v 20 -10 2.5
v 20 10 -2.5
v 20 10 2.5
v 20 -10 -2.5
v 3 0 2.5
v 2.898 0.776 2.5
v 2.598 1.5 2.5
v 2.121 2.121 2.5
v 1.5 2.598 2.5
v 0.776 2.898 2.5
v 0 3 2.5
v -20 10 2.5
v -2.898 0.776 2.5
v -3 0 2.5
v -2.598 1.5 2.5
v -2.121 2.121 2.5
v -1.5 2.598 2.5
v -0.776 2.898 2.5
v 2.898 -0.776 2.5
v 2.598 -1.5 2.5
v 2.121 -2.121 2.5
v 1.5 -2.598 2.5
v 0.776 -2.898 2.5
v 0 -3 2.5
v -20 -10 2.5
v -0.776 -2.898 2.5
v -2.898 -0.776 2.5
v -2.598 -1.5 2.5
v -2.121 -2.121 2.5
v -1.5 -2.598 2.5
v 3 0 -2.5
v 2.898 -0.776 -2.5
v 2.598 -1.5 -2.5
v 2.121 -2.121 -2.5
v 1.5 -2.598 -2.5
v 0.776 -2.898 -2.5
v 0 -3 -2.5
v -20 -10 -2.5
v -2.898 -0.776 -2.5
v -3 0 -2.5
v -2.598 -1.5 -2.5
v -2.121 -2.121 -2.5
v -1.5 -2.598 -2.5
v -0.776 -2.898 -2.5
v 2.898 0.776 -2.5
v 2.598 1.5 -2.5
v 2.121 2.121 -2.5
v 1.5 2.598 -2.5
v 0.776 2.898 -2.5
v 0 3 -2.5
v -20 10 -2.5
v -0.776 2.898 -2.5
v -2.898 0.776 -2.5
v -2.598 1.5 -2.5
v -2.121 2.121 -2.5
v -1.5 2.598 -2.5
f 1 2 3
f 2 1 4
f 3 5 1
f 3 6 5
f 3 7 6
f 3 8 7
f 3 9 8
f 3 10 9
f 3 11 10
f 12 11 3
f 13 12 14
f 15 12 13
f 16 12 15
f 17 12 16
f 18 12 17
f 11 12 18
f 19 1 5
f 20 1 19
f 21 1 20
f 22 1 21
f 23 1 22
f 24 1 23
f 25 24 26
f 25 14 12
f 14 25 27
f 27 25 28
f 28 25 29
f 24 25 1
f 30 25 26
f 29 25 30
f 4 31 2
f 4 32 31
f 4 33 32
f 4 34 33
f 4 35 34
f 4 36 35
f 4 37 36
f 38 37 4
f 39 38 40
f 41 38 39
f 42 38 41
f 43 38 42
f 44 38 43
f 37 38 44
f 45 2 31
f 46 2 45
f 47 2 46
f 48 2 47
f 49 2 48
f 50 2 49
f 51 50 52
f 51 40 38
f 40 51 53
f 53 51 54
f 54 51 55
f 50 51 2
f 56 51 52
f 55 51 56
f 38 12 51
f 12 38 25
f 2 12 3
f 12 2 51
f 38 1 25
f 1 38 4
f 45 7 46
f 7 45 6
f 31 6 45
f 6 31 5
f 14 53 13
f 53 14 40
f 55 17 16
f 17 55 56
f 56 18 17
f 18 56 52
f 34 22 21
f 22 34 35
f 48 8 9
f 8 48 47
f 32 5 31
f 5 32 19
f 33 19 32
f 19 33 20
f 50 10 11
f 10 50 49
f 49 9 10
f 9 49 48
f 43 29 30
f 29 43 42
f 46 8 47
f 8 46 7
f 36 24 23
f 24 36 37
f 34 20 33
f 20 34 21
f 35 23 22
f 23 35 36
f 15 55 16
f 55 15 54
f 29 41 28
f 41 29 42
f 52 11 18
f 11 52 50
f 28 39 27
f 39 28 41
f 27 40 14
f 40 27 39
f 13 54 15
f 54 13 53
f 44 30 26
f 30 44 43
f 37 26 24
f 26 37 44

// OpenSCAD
// parametric.scad — a Customizer-style plate with a through hole.
//
// The top-level literals below (before the first module) are what OpenSCAD's
// Customizer shows, and what the `list_scad_parameters` MCP tool reads from
// this text without running openscad. `convert_scad` re-evaluates the file at
// other values via `-D name=value`, leaving this source untouched.
//
// Analytic volume at the defaults: width*depth*thickness minus the hole
// (a 24-sided prism, r = 3): 4000 - (24/2) * 3^2 * sin(2*pi/24) * 5 = 4000 - 139.75 = 3860.25.
// Widening the plate by 20 adds exactly 20*20*5 = 2000 (the hole is unaffected).

/* [Plate] */
// Plate width in mm
width = 40; // [10:5:100]
// Plate depth in mm
depth = 20; // [10:5:60]
// Plate thickness in mm
thickness = 5; // [1:1:20]

/* [Hole] */
// Radius of the through hole in mm
hole_radius = 3; // [1:0.5:8]
show_hole = true;
finish = "plain"; // [plain, chamfered:Chamfered edge]

/* [Hidden] */
$fn = 24;

module plate() {
  difference() {
    cube([width, depth, thickness], center = true);
    if (show_hole) cylinder(r = hole_radius, h = thickness + 2, center = true);
  }
}

plate();
